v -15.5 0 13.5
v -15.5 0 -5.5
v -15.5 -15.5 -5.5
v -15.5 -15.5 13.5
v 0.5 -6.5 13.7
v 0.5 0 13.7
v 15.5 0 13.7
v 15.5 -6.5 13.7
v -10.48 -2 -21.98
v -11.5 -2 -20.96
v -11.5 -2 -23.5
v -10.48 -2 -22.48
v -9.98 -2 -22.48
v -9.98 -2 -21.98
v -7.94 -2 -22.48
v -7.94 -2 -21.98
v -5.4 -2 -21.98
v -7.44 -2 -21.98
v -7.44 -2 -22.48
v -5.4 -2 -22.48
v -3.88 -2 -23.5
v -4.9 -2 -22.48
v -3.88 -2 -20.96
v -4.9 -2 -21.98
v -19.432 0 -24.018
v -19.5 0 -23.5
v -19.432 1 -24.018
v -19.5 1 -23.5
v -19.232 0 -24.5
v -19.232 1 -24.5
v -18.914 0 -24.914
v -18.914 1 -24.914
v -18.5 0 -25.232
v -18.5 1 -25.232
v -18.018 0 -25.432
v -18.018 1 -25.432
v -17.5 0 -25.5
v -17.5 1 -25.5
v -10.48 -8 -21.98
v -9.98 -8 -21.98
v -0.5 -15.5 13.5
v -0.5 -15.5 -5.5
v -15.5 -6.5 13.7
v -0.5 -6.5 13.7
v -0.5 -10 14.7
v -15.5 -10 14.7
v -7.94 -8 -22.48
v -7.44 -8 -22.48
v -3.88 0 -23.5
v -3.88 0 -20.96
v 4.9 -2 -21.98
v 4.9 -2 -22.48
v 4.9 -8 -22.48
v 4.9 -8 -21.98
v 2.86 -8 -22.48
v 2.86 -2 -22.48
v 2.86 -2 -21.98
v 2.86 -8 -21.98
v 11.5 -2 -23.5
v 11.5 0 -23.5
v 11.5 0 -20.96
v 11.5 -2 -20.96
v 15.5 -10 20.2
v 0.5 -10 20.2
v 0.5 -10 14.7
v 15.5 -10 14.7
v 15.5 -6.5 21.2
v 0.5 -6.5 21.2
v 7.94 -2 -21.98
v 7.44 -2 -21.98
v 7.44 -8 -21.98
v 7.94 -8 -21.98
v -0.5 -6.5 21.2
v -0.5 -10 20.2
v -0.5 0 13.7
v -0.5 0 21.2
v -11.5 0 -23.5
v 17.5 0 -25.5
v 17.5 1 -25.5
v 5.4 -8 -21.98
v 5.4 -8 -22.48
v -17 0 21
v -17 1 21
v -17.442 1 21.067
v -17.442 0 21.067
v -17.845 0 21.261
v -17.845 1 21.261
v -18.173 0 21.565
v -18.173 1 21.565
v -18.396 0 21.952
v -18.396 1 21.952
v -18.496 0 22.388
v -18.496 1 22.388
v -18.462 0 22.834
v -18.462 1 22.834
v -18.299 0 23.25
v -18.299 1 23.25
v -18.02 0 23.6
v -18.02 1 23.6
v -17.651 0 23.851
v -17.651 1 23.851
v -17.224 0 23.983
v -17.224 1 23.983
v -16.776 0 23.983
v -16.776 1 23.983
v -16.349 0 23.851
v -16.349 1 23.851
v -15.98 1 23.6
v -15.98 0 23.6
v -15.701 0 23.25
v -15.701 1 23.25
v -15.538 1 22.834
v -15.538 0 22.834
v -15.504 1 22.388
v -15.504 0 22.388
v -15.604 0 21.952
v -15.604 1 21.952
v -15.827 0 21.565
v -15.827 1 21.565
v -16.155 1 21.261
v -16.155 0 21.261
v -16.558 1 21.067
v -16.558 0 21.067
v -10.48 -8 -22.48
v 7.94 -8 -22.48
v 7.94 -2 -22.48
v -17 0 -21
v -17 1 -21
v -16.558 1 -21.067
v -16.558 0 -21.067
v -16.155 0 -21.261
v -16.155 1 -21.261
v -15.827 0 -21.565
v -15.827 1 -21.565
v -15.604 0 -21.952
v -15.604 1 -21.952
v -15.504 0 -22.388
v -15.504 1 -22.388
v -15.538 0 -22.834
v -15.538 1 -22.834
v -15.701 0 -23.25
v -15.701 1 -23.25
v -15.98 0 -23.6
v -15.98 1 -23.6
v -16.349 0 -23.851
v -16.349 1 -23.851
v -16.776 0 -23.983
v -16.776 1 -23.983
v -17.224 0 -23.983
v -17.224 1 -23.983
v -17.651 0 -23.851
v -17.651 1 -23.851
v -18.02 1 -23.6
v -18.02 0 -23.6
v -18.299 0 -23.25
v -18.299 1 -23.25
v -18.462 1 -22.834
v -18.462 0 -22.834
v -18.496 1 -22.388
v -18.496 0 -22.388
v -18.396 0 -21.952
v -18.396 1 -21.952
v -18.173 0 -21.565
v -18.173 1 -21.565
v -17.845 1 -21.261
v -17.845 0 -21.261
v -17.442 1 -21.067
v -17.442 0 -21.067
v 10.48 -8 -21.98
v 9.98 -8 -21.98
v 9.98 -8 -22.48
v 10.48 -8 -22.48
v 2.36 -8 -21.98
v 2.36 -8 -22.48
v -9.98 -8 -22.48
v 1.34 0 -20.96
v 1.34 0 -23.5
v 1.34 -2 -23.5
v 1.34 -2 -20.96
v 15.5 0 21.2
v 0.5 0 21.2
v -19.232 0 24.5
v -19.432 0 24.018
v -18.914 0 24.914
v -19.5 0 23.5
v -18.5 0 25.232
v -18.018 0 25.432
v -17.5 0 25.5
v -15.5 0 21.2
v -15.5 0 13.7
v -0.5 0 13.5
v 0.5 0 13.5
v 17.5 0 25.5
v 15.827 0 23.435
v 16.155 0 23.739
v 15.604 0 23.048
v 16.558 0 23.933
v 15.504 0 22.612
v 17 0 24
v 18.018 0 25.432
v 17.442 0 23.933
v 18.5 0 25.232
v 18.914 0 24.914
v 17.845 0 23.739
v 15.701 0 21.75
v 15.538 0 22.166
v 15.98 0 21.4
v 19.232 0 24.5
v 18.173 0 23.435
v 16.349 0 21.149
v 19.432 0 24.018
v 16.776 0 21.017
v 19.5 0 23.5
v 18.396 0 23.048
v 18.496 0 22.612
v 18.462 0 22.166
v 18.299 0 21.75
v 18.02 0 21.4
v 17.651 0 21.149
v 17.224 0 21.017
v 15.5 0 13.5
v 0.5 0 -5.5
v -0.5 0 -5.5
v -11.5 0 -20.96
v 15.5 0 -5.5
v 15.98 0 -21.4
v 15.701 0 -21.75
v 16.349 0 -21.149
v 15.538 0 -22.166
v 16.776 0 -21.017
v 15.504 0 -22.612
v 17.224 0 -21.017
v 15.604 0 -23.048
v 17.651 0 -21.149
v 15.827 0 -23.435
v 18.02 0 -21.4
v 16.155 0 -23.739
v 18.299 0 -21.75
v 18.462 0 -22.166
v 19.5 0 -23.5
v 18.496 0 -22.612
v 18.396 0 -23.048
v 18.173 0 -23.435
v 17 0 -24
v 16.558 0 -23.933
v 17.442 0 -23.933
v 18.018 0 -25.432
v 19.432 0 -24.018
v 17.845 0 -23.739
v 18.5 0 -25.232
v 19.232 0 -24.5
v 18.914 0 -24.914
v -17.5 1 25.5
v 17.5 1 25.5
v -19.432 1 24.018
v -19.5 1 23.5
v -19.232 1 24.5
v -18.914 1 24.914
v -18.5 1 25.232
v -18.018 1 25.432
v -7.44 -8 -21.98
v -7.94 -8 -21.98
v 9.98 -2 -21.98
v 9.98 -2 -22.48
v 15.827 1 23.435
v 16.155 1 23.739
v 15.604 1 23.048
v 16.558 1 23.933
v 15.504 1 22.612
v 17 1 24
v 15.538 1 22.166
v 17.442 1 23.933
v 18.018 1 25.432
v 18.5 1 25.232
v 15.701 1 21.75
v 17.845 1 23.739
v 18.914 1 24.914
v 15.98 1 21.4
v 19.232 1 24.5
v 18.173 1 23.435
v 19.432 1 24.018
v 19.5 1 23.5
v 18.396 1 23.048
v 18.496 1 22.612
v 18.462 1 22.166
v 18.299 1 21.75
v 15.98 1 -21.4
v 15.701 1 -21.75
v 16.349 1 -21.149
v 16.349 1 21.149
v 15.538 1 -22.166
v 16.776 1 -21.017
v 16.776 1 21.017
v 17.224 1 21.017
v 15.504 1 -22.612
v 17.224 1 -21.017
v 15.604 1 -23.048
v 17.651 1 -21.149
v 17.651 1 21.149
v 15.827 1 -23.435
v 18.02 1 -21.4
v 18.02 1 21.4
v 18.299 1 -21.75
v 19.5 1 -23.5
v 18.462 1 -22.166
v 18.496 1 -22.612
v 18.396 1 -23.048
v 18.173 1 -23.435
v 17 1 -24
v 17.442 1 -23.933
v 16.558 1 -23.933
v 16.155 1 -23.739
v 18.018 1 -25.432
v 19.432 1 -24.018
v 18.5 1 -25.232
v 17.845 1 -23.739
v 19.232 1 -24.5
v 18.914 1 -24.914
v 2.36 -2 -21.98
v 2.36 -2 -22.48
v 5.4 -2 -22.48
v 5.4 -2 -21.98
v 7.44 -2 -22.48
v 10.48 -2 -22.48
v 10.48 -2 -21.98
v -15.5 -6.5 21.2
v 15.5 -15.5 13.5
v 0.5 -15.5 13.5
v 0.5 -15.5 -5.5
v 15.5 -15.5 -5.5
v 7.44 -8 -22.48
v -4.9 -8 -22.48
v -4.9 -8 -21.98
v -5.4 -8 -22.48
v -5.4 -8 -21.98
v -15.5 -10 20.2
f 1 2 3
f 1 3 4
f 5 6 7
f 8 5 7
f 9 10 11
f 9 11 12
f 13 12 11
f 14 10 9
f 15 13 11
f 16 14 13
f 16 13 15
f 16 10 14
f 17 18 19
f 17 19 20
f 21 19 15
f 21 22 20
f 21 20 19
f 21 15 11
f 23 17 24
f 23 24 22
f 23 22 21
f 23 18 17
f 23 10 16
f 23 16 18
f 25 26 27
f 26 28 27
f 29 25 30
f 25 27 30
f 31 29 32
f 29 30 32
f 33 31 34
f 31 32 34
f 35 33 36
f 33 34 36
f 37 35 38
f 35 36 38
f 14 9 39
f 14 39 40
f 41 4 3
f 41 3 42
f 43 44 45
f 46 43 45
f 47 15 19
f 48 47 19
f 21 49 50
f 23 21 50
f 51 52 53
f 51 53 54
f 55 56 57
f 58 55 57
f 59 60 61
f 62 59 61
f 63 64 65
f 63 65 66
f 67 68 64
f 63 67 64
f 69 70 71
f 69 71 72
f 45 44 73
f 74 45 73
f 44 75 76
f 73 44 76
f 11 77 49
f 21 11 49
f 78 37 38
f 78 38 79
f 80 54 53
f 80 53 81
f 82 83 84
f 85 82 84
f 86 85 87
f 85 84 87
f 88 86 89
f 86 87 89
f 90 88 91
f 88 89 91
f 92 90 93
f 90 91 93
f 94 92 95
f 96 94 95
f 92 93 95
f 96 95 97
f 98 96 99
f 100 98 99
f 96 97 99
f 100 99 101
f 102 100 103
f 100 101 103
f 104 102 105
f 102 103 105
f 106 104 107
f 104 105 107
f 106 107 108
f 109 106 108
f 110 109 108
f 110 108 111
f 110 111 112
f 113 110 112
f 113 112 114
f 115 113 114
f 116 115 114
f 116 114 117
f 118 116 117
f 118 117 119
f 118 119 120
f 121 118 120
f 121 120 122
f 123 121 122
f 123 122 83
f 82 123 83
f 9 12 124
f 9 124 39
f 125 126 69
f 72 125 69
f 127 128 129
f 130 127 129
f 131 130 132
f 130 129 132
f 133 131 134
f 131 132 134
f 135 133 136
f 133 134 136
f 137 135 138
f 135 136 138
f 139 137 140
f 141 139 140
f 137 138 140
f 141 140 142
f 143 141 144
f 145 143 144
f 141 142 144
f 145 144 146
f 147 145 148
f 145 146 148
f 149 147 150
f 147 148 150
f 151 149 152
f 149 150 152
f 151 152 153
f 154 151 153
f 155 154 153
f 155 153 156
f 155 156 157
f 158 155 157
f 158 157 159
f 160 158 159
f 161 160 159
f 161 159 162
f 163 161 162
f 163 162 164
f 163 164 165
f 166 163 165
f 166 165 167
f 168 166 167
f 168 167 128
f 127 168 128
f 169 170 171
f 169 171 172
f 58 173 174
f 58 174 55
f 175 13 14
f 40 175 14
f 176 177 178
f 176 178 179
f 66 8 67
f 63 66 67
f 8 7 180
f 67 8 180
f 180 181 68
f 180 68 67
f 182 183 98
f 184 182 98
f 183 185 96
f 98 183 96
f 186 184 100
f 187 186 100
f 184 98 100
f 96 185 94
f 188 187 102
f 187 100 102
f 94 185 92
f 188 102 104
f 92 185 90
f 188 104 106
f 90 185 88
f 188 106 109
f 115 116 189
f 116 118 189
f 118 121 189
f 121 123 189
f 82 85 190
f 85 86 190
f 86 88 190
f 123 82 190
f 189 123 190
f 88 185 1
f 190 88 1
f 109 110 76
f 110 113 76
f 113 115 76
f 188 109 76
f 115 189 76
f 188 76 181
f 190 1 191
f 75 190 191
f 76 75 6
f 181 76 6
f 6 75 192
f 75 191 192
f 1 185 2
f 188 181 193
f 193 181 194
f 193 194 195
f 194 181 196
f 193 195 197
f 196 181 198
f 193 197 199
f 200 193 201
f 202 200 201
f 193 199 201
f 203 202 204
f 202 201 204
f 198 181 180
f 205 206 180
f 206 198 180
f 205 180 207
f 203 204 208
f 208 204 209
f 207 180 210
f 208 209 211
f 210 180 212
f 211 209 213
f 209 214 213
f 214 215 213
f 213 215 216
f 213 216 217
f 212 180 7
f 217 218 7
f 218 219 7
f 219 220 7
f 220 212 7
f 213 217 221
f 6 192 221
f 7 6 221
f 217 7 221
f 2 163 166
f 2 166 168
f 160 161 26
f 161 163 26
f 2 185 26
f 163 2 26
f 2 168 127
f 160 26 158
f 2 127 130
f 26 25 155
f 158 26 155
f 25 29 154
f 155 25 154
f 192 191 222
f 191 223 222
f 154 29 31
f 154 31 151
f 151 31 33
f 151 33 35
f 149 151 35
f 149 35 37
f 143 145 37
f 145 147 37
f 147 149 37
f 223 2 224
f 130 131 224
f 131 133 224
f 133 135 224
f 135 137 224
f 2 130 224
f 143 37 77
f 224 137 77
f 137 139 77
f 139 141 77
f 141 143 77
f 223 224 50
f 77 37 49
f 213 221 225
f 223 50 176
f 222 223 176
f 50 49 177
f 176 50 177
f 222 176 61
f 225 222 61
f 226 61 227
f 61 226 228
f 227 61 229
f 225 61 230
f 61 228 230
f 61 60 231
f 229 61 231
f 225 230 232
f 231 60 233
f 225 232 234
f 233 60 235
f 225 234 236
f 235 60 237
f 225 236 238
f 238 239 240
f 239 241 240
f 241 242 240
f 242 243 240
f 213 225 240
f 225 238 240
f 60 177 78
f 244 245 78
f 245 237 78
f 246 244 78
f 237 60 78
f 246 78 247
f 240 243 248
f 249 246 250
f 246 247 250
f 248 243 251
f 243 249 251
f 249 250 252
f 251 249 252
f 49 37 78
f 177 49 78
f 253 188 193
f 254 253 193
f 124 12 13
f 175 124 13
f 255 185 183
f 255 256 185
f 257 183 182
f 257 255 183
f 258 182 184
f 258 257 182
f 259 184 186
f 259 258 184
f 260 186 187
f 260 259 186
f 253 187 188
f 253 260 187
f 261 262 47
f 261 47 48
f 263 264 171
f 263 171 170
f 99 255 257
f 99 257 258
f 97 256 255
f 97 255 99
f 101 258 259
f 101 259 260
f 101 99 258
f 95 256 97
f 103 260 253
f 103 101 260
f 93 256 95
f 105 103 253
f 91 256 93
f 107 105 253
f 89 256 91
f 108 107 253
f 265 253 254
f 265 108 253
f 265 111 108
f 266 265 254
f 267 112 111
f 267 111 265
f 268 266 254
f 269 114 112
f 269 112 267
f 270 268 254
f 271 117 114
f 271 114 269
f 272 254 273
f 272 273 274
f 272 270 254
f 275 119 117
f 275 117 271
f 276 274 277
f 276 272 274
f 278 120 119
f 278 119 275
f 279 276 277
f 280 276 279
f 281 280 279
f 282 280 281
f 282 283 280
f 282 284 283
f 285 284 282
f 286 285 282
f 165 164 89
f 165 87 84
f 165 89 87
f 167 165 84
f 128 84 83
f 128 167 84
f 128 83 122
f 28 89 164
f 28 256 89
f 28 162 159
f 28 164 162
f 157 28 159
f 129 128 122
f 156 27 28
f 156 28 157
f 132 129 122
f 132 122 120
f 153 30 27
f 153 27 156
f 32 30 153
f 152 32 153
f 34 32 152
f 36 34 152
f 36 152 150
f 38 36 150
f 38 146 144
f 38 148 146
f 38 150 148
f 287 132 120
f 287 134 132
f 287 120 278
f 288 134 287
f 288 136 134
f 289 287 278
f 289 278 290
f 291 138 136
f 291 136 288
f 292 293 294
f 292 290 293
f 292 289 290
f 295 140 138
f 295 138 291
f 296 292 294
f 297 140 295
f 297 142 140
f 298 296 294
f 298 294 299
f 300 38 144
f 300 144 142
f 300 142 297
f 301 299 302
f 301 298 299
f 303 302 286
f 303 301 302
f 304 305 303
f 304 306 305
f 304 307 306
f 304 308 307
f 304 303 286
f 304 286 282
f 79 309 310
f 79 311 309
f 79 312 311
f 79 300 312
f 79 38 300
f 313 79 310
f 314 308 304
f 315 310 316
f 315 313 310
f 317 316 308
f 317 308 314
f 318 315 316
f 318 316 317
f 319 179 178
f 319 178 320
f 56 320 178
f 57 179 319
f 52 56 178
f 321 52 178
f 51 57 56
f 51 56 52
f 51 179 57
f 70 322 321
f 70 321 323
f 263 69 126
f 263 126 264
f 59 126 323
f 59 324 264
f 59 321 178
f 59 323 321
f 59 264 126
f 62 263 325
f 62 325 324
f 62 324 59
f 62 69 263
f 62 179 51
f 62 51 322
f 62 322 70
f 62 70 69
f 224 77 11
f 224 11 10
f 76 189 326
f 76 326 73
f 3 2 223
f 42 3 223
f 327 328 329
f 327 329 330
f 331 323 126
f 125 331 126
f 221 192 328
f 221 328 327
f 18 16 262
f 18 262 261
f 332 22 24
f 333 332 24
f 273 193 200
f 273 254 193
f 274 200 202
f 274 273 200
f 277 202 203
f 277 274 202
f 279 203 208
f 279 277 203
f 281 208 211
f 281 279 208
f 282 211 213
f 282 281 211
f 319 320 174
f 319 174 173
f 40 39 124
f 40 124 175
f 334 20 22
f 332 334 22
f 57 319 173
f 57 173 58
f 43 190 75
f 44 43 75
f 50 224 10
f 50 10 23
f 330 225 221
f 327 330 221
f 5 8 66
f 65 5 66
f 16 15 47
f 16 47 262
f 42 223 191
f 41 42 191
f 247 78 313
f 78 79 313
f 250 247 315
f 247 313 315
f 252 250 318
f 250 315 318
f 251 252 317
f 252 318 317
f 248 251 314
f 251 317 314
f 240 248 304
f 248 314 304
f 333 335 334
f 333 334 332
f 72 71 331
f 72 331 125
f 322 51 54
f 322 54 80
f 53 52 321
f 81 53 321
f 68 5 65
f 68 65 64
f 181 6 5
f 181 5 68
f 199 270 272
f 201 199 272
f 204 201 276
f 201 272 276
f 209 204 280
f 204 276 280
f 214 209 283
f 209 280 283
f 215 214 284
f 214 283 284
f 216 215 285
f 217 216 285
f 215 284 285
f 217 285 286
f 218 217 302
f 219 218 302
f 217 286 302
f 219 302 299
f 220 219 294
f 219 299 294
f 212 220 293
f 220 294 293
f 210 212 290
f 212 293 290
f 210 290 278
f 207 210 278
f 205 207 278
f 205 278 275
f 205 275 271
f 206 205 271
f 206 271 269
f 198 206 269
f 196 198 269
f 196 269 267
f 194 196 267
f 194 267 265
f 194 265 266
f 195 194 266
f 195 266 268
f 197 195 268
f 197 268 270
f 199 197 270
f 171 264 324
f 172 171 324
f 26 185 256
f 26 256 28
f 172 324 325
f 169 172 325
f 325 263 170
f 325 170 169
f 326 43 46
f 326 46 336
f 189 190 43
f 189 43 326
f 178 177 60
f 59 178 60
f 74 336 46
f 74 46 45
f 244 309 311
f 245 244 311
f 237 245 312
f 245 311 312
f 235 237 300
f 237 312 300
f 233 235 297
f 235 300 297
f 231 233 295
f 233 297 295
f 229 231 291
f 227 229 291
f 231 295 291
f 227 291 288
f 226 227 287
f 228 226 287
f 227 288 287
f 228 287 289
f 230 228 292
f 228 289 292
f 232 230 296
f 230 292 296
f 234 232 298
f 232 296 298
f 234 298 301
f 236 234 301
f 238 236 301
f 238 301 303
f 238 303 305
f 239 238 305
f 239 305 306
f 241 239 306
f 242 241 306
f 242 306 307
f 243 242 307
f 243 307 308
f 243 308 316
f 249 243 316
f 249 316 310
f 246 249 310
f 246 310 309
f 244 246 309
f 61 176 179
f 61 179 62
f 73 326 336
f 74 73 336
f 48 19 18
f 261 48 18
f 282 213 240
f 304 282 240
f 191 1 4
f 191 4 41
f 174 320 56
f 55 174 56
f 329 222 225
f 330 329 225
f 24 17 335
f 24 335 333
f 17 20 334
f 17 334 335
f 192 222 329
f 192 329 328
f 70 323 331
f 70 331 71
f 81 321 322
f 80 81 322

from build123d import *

# Parameters (mm, degrees)
SKETCH1_W               = 39
SKETCH1_H               = 51
BOSS_EXTRUDE1_DEPTH     = 1
SKETCH2_R               = 1.5
CUT_EXTRUDE1_DEPTH      = 33.116973706
FILLET1_R               = 2
SKETCH3_W               = 15
SKETCH3_H               = 19
BOSS_EXTRUDE2_DEPTH     = 15.5
SKETCH4_W               = 15
SKETCH4_H               = 7.5
BOSS_EXTRUDE3_DEPTH     = 10
CUT_EXTRUDE2_DEPTH      = 36.647580563
CUT_EXTRUDE2_DEPTH_BACK = 36.647580563
SKETCH6_W               = 7.62
SKETCH6_H               = 2.54
SKETCH6_W_2             = 10.16
BOSS_EXTRUDE4_DEPTH     = 2
SKETCH7_W               = 0.5
SKETCH7_H               = 0.5
BOSS_EXTRUDE5_DEPTH     = 6


with BuildPart() as part:
    # Sketch1 → Boss-Extrude1 (new body)
    with BuildSketch(Plane(origin=(0, 0, 0), x_dir=(1, 0, 0), z_dir=(0, 1, 0))):
        Rectangle(SKETCH1_W, SKETCH1_H)
    extrude(amount=BOSS_EXTRUDE1_DEPTH)

    # Sketch2 → Cut-Extrude1 (cut, through all)
    with BuildSketch(Plane(origin=(0, 1, 0), x_dir=(1, 0, 0), z_dir=(0, 1, 0))):
        with Locations(Location((-17, 22.5, 0), (0, 0, 270))):
            Circle(SKETCH2_R)
        with Locations(Location((17, 22.5, 0), (0, 0, 90))):
            Circle(SKETCH2_R)
        with Locations(Location((17, -22.5, 0), (0, 0, 270))):
            Circle(SKETCH2_R)
        with Locations(Location((-17, -22.5, 0), (0, 0, 90))):
            Circle(SKETCH2_R)
    extrude(amount=-CUT_EXTRUDE1_DEPTH, mode=Mode.SUBTRACT)

    # Fillet1
    fillet1_edges = [part.edges().sort_by_distance(p)[0] for p in [
        (19.5, 0.5, 25.5),
        (-19.5, 0.5, 25.5),
        (-19.5, 0.5, -25.5),
        (19.5, 0.5, -25.5),
    ]]
    fillet(fillet1_edges, radius=FILLET1_R)

    # Sketch3 → Boss-Extrude2 (add)
    with BuildSketch(Plane.XZ):
        with Locations((-8, 4)):
            Rectangle(SKETCH3_W, SKETCH3_H)
        with Locations((8, 4)):
            Rectangle(SKETCH3_W, SKETCH3_H)
    extrude(amount=BOSS_EXTRUDE2_DEPTH)

    # Sketch4 → Boss-Extrude3 (add)
    with BuildSketch(Plane.XZ):
        with Locations((-8, 17.45)):
            Rectangle(SKETCH4_W, SKETCH4_H)
        with Locations((8, 17.45)):
            Rectangle(SKETCH4_W, SKETCH4_H)
    extrude(amount=BOSS_EXTRUDE3_DEPTH)

    # Sketch5 → Cut-Extrude2 (cut, two sides: drawn at the far end of the back side and taken through both)
    with BuildSketch(Plane(origin=(0, 0, 0), x_dir=(0, 0, -1), z_dir=(1, 0, 0)).offset(-CUT_EXTRUDE2_DEPTH_BACK)):
        Polygon((-21.2, -10), (-21.2, -6.5), (-20.2, -10), align=None)
        Polygon((-14.7, -10), (-13.7, -10), (-13.7, -6.5), align=None)
    extrude(amount=CUT_EXTRUDE2_DEPTH + CUT_EXTRUDE2_DEPTH_BACK, mode=Mode.SUBTRACT)

    # Sketch6 → Boss-Extrude4 (add)
    with BuildSketch(Plane.XZ):
        with Locations((-7.69, -22.23)):
            Rectangle(SKETCH6_W, SKETCH6_H)
        with Locations((6.42, -22.23)):
            Rectangle(SKETCH6_W_2, SKETCH6_H)
    extrude(amount=BOSS_EXTRUDE4_DEPTH)

    # Sketch7 → Boss-Extrude5 (add)
    with BuildSketch(Plane.XZ.offset(2)):
        with Locations((7.69, -22.23)):
            Rectangle(SKETCH7_W, SKETCH7_H)
        with Locations((10.23, -22.23)):
            Rectangle(SKETCH7_W, SKETCH7_H)
        with Locations((5.15, -22.23)):
            Rectangle(SKETCH7_W, SKETCH7_H)
        with Locations((2.61, -22.23)):
            Rectangle(SKETCH7_W, SKETCH7_H)
        with Locations((-5.15, -22.23)):
            Rectangle(SKETCH7_W, SKETCH7_H)
        with Locations((-7.69, -22.23)):
            Rectangle(SKETCH7_W, SKETCH7_H)
        with Locations((-10.23, -22.23)):
            Rectangle(SKETCH7_W, SKETCH7_H)
    extrude(amount=BOSS_EXTRUDE5_DEPTH)


solid = part.part
